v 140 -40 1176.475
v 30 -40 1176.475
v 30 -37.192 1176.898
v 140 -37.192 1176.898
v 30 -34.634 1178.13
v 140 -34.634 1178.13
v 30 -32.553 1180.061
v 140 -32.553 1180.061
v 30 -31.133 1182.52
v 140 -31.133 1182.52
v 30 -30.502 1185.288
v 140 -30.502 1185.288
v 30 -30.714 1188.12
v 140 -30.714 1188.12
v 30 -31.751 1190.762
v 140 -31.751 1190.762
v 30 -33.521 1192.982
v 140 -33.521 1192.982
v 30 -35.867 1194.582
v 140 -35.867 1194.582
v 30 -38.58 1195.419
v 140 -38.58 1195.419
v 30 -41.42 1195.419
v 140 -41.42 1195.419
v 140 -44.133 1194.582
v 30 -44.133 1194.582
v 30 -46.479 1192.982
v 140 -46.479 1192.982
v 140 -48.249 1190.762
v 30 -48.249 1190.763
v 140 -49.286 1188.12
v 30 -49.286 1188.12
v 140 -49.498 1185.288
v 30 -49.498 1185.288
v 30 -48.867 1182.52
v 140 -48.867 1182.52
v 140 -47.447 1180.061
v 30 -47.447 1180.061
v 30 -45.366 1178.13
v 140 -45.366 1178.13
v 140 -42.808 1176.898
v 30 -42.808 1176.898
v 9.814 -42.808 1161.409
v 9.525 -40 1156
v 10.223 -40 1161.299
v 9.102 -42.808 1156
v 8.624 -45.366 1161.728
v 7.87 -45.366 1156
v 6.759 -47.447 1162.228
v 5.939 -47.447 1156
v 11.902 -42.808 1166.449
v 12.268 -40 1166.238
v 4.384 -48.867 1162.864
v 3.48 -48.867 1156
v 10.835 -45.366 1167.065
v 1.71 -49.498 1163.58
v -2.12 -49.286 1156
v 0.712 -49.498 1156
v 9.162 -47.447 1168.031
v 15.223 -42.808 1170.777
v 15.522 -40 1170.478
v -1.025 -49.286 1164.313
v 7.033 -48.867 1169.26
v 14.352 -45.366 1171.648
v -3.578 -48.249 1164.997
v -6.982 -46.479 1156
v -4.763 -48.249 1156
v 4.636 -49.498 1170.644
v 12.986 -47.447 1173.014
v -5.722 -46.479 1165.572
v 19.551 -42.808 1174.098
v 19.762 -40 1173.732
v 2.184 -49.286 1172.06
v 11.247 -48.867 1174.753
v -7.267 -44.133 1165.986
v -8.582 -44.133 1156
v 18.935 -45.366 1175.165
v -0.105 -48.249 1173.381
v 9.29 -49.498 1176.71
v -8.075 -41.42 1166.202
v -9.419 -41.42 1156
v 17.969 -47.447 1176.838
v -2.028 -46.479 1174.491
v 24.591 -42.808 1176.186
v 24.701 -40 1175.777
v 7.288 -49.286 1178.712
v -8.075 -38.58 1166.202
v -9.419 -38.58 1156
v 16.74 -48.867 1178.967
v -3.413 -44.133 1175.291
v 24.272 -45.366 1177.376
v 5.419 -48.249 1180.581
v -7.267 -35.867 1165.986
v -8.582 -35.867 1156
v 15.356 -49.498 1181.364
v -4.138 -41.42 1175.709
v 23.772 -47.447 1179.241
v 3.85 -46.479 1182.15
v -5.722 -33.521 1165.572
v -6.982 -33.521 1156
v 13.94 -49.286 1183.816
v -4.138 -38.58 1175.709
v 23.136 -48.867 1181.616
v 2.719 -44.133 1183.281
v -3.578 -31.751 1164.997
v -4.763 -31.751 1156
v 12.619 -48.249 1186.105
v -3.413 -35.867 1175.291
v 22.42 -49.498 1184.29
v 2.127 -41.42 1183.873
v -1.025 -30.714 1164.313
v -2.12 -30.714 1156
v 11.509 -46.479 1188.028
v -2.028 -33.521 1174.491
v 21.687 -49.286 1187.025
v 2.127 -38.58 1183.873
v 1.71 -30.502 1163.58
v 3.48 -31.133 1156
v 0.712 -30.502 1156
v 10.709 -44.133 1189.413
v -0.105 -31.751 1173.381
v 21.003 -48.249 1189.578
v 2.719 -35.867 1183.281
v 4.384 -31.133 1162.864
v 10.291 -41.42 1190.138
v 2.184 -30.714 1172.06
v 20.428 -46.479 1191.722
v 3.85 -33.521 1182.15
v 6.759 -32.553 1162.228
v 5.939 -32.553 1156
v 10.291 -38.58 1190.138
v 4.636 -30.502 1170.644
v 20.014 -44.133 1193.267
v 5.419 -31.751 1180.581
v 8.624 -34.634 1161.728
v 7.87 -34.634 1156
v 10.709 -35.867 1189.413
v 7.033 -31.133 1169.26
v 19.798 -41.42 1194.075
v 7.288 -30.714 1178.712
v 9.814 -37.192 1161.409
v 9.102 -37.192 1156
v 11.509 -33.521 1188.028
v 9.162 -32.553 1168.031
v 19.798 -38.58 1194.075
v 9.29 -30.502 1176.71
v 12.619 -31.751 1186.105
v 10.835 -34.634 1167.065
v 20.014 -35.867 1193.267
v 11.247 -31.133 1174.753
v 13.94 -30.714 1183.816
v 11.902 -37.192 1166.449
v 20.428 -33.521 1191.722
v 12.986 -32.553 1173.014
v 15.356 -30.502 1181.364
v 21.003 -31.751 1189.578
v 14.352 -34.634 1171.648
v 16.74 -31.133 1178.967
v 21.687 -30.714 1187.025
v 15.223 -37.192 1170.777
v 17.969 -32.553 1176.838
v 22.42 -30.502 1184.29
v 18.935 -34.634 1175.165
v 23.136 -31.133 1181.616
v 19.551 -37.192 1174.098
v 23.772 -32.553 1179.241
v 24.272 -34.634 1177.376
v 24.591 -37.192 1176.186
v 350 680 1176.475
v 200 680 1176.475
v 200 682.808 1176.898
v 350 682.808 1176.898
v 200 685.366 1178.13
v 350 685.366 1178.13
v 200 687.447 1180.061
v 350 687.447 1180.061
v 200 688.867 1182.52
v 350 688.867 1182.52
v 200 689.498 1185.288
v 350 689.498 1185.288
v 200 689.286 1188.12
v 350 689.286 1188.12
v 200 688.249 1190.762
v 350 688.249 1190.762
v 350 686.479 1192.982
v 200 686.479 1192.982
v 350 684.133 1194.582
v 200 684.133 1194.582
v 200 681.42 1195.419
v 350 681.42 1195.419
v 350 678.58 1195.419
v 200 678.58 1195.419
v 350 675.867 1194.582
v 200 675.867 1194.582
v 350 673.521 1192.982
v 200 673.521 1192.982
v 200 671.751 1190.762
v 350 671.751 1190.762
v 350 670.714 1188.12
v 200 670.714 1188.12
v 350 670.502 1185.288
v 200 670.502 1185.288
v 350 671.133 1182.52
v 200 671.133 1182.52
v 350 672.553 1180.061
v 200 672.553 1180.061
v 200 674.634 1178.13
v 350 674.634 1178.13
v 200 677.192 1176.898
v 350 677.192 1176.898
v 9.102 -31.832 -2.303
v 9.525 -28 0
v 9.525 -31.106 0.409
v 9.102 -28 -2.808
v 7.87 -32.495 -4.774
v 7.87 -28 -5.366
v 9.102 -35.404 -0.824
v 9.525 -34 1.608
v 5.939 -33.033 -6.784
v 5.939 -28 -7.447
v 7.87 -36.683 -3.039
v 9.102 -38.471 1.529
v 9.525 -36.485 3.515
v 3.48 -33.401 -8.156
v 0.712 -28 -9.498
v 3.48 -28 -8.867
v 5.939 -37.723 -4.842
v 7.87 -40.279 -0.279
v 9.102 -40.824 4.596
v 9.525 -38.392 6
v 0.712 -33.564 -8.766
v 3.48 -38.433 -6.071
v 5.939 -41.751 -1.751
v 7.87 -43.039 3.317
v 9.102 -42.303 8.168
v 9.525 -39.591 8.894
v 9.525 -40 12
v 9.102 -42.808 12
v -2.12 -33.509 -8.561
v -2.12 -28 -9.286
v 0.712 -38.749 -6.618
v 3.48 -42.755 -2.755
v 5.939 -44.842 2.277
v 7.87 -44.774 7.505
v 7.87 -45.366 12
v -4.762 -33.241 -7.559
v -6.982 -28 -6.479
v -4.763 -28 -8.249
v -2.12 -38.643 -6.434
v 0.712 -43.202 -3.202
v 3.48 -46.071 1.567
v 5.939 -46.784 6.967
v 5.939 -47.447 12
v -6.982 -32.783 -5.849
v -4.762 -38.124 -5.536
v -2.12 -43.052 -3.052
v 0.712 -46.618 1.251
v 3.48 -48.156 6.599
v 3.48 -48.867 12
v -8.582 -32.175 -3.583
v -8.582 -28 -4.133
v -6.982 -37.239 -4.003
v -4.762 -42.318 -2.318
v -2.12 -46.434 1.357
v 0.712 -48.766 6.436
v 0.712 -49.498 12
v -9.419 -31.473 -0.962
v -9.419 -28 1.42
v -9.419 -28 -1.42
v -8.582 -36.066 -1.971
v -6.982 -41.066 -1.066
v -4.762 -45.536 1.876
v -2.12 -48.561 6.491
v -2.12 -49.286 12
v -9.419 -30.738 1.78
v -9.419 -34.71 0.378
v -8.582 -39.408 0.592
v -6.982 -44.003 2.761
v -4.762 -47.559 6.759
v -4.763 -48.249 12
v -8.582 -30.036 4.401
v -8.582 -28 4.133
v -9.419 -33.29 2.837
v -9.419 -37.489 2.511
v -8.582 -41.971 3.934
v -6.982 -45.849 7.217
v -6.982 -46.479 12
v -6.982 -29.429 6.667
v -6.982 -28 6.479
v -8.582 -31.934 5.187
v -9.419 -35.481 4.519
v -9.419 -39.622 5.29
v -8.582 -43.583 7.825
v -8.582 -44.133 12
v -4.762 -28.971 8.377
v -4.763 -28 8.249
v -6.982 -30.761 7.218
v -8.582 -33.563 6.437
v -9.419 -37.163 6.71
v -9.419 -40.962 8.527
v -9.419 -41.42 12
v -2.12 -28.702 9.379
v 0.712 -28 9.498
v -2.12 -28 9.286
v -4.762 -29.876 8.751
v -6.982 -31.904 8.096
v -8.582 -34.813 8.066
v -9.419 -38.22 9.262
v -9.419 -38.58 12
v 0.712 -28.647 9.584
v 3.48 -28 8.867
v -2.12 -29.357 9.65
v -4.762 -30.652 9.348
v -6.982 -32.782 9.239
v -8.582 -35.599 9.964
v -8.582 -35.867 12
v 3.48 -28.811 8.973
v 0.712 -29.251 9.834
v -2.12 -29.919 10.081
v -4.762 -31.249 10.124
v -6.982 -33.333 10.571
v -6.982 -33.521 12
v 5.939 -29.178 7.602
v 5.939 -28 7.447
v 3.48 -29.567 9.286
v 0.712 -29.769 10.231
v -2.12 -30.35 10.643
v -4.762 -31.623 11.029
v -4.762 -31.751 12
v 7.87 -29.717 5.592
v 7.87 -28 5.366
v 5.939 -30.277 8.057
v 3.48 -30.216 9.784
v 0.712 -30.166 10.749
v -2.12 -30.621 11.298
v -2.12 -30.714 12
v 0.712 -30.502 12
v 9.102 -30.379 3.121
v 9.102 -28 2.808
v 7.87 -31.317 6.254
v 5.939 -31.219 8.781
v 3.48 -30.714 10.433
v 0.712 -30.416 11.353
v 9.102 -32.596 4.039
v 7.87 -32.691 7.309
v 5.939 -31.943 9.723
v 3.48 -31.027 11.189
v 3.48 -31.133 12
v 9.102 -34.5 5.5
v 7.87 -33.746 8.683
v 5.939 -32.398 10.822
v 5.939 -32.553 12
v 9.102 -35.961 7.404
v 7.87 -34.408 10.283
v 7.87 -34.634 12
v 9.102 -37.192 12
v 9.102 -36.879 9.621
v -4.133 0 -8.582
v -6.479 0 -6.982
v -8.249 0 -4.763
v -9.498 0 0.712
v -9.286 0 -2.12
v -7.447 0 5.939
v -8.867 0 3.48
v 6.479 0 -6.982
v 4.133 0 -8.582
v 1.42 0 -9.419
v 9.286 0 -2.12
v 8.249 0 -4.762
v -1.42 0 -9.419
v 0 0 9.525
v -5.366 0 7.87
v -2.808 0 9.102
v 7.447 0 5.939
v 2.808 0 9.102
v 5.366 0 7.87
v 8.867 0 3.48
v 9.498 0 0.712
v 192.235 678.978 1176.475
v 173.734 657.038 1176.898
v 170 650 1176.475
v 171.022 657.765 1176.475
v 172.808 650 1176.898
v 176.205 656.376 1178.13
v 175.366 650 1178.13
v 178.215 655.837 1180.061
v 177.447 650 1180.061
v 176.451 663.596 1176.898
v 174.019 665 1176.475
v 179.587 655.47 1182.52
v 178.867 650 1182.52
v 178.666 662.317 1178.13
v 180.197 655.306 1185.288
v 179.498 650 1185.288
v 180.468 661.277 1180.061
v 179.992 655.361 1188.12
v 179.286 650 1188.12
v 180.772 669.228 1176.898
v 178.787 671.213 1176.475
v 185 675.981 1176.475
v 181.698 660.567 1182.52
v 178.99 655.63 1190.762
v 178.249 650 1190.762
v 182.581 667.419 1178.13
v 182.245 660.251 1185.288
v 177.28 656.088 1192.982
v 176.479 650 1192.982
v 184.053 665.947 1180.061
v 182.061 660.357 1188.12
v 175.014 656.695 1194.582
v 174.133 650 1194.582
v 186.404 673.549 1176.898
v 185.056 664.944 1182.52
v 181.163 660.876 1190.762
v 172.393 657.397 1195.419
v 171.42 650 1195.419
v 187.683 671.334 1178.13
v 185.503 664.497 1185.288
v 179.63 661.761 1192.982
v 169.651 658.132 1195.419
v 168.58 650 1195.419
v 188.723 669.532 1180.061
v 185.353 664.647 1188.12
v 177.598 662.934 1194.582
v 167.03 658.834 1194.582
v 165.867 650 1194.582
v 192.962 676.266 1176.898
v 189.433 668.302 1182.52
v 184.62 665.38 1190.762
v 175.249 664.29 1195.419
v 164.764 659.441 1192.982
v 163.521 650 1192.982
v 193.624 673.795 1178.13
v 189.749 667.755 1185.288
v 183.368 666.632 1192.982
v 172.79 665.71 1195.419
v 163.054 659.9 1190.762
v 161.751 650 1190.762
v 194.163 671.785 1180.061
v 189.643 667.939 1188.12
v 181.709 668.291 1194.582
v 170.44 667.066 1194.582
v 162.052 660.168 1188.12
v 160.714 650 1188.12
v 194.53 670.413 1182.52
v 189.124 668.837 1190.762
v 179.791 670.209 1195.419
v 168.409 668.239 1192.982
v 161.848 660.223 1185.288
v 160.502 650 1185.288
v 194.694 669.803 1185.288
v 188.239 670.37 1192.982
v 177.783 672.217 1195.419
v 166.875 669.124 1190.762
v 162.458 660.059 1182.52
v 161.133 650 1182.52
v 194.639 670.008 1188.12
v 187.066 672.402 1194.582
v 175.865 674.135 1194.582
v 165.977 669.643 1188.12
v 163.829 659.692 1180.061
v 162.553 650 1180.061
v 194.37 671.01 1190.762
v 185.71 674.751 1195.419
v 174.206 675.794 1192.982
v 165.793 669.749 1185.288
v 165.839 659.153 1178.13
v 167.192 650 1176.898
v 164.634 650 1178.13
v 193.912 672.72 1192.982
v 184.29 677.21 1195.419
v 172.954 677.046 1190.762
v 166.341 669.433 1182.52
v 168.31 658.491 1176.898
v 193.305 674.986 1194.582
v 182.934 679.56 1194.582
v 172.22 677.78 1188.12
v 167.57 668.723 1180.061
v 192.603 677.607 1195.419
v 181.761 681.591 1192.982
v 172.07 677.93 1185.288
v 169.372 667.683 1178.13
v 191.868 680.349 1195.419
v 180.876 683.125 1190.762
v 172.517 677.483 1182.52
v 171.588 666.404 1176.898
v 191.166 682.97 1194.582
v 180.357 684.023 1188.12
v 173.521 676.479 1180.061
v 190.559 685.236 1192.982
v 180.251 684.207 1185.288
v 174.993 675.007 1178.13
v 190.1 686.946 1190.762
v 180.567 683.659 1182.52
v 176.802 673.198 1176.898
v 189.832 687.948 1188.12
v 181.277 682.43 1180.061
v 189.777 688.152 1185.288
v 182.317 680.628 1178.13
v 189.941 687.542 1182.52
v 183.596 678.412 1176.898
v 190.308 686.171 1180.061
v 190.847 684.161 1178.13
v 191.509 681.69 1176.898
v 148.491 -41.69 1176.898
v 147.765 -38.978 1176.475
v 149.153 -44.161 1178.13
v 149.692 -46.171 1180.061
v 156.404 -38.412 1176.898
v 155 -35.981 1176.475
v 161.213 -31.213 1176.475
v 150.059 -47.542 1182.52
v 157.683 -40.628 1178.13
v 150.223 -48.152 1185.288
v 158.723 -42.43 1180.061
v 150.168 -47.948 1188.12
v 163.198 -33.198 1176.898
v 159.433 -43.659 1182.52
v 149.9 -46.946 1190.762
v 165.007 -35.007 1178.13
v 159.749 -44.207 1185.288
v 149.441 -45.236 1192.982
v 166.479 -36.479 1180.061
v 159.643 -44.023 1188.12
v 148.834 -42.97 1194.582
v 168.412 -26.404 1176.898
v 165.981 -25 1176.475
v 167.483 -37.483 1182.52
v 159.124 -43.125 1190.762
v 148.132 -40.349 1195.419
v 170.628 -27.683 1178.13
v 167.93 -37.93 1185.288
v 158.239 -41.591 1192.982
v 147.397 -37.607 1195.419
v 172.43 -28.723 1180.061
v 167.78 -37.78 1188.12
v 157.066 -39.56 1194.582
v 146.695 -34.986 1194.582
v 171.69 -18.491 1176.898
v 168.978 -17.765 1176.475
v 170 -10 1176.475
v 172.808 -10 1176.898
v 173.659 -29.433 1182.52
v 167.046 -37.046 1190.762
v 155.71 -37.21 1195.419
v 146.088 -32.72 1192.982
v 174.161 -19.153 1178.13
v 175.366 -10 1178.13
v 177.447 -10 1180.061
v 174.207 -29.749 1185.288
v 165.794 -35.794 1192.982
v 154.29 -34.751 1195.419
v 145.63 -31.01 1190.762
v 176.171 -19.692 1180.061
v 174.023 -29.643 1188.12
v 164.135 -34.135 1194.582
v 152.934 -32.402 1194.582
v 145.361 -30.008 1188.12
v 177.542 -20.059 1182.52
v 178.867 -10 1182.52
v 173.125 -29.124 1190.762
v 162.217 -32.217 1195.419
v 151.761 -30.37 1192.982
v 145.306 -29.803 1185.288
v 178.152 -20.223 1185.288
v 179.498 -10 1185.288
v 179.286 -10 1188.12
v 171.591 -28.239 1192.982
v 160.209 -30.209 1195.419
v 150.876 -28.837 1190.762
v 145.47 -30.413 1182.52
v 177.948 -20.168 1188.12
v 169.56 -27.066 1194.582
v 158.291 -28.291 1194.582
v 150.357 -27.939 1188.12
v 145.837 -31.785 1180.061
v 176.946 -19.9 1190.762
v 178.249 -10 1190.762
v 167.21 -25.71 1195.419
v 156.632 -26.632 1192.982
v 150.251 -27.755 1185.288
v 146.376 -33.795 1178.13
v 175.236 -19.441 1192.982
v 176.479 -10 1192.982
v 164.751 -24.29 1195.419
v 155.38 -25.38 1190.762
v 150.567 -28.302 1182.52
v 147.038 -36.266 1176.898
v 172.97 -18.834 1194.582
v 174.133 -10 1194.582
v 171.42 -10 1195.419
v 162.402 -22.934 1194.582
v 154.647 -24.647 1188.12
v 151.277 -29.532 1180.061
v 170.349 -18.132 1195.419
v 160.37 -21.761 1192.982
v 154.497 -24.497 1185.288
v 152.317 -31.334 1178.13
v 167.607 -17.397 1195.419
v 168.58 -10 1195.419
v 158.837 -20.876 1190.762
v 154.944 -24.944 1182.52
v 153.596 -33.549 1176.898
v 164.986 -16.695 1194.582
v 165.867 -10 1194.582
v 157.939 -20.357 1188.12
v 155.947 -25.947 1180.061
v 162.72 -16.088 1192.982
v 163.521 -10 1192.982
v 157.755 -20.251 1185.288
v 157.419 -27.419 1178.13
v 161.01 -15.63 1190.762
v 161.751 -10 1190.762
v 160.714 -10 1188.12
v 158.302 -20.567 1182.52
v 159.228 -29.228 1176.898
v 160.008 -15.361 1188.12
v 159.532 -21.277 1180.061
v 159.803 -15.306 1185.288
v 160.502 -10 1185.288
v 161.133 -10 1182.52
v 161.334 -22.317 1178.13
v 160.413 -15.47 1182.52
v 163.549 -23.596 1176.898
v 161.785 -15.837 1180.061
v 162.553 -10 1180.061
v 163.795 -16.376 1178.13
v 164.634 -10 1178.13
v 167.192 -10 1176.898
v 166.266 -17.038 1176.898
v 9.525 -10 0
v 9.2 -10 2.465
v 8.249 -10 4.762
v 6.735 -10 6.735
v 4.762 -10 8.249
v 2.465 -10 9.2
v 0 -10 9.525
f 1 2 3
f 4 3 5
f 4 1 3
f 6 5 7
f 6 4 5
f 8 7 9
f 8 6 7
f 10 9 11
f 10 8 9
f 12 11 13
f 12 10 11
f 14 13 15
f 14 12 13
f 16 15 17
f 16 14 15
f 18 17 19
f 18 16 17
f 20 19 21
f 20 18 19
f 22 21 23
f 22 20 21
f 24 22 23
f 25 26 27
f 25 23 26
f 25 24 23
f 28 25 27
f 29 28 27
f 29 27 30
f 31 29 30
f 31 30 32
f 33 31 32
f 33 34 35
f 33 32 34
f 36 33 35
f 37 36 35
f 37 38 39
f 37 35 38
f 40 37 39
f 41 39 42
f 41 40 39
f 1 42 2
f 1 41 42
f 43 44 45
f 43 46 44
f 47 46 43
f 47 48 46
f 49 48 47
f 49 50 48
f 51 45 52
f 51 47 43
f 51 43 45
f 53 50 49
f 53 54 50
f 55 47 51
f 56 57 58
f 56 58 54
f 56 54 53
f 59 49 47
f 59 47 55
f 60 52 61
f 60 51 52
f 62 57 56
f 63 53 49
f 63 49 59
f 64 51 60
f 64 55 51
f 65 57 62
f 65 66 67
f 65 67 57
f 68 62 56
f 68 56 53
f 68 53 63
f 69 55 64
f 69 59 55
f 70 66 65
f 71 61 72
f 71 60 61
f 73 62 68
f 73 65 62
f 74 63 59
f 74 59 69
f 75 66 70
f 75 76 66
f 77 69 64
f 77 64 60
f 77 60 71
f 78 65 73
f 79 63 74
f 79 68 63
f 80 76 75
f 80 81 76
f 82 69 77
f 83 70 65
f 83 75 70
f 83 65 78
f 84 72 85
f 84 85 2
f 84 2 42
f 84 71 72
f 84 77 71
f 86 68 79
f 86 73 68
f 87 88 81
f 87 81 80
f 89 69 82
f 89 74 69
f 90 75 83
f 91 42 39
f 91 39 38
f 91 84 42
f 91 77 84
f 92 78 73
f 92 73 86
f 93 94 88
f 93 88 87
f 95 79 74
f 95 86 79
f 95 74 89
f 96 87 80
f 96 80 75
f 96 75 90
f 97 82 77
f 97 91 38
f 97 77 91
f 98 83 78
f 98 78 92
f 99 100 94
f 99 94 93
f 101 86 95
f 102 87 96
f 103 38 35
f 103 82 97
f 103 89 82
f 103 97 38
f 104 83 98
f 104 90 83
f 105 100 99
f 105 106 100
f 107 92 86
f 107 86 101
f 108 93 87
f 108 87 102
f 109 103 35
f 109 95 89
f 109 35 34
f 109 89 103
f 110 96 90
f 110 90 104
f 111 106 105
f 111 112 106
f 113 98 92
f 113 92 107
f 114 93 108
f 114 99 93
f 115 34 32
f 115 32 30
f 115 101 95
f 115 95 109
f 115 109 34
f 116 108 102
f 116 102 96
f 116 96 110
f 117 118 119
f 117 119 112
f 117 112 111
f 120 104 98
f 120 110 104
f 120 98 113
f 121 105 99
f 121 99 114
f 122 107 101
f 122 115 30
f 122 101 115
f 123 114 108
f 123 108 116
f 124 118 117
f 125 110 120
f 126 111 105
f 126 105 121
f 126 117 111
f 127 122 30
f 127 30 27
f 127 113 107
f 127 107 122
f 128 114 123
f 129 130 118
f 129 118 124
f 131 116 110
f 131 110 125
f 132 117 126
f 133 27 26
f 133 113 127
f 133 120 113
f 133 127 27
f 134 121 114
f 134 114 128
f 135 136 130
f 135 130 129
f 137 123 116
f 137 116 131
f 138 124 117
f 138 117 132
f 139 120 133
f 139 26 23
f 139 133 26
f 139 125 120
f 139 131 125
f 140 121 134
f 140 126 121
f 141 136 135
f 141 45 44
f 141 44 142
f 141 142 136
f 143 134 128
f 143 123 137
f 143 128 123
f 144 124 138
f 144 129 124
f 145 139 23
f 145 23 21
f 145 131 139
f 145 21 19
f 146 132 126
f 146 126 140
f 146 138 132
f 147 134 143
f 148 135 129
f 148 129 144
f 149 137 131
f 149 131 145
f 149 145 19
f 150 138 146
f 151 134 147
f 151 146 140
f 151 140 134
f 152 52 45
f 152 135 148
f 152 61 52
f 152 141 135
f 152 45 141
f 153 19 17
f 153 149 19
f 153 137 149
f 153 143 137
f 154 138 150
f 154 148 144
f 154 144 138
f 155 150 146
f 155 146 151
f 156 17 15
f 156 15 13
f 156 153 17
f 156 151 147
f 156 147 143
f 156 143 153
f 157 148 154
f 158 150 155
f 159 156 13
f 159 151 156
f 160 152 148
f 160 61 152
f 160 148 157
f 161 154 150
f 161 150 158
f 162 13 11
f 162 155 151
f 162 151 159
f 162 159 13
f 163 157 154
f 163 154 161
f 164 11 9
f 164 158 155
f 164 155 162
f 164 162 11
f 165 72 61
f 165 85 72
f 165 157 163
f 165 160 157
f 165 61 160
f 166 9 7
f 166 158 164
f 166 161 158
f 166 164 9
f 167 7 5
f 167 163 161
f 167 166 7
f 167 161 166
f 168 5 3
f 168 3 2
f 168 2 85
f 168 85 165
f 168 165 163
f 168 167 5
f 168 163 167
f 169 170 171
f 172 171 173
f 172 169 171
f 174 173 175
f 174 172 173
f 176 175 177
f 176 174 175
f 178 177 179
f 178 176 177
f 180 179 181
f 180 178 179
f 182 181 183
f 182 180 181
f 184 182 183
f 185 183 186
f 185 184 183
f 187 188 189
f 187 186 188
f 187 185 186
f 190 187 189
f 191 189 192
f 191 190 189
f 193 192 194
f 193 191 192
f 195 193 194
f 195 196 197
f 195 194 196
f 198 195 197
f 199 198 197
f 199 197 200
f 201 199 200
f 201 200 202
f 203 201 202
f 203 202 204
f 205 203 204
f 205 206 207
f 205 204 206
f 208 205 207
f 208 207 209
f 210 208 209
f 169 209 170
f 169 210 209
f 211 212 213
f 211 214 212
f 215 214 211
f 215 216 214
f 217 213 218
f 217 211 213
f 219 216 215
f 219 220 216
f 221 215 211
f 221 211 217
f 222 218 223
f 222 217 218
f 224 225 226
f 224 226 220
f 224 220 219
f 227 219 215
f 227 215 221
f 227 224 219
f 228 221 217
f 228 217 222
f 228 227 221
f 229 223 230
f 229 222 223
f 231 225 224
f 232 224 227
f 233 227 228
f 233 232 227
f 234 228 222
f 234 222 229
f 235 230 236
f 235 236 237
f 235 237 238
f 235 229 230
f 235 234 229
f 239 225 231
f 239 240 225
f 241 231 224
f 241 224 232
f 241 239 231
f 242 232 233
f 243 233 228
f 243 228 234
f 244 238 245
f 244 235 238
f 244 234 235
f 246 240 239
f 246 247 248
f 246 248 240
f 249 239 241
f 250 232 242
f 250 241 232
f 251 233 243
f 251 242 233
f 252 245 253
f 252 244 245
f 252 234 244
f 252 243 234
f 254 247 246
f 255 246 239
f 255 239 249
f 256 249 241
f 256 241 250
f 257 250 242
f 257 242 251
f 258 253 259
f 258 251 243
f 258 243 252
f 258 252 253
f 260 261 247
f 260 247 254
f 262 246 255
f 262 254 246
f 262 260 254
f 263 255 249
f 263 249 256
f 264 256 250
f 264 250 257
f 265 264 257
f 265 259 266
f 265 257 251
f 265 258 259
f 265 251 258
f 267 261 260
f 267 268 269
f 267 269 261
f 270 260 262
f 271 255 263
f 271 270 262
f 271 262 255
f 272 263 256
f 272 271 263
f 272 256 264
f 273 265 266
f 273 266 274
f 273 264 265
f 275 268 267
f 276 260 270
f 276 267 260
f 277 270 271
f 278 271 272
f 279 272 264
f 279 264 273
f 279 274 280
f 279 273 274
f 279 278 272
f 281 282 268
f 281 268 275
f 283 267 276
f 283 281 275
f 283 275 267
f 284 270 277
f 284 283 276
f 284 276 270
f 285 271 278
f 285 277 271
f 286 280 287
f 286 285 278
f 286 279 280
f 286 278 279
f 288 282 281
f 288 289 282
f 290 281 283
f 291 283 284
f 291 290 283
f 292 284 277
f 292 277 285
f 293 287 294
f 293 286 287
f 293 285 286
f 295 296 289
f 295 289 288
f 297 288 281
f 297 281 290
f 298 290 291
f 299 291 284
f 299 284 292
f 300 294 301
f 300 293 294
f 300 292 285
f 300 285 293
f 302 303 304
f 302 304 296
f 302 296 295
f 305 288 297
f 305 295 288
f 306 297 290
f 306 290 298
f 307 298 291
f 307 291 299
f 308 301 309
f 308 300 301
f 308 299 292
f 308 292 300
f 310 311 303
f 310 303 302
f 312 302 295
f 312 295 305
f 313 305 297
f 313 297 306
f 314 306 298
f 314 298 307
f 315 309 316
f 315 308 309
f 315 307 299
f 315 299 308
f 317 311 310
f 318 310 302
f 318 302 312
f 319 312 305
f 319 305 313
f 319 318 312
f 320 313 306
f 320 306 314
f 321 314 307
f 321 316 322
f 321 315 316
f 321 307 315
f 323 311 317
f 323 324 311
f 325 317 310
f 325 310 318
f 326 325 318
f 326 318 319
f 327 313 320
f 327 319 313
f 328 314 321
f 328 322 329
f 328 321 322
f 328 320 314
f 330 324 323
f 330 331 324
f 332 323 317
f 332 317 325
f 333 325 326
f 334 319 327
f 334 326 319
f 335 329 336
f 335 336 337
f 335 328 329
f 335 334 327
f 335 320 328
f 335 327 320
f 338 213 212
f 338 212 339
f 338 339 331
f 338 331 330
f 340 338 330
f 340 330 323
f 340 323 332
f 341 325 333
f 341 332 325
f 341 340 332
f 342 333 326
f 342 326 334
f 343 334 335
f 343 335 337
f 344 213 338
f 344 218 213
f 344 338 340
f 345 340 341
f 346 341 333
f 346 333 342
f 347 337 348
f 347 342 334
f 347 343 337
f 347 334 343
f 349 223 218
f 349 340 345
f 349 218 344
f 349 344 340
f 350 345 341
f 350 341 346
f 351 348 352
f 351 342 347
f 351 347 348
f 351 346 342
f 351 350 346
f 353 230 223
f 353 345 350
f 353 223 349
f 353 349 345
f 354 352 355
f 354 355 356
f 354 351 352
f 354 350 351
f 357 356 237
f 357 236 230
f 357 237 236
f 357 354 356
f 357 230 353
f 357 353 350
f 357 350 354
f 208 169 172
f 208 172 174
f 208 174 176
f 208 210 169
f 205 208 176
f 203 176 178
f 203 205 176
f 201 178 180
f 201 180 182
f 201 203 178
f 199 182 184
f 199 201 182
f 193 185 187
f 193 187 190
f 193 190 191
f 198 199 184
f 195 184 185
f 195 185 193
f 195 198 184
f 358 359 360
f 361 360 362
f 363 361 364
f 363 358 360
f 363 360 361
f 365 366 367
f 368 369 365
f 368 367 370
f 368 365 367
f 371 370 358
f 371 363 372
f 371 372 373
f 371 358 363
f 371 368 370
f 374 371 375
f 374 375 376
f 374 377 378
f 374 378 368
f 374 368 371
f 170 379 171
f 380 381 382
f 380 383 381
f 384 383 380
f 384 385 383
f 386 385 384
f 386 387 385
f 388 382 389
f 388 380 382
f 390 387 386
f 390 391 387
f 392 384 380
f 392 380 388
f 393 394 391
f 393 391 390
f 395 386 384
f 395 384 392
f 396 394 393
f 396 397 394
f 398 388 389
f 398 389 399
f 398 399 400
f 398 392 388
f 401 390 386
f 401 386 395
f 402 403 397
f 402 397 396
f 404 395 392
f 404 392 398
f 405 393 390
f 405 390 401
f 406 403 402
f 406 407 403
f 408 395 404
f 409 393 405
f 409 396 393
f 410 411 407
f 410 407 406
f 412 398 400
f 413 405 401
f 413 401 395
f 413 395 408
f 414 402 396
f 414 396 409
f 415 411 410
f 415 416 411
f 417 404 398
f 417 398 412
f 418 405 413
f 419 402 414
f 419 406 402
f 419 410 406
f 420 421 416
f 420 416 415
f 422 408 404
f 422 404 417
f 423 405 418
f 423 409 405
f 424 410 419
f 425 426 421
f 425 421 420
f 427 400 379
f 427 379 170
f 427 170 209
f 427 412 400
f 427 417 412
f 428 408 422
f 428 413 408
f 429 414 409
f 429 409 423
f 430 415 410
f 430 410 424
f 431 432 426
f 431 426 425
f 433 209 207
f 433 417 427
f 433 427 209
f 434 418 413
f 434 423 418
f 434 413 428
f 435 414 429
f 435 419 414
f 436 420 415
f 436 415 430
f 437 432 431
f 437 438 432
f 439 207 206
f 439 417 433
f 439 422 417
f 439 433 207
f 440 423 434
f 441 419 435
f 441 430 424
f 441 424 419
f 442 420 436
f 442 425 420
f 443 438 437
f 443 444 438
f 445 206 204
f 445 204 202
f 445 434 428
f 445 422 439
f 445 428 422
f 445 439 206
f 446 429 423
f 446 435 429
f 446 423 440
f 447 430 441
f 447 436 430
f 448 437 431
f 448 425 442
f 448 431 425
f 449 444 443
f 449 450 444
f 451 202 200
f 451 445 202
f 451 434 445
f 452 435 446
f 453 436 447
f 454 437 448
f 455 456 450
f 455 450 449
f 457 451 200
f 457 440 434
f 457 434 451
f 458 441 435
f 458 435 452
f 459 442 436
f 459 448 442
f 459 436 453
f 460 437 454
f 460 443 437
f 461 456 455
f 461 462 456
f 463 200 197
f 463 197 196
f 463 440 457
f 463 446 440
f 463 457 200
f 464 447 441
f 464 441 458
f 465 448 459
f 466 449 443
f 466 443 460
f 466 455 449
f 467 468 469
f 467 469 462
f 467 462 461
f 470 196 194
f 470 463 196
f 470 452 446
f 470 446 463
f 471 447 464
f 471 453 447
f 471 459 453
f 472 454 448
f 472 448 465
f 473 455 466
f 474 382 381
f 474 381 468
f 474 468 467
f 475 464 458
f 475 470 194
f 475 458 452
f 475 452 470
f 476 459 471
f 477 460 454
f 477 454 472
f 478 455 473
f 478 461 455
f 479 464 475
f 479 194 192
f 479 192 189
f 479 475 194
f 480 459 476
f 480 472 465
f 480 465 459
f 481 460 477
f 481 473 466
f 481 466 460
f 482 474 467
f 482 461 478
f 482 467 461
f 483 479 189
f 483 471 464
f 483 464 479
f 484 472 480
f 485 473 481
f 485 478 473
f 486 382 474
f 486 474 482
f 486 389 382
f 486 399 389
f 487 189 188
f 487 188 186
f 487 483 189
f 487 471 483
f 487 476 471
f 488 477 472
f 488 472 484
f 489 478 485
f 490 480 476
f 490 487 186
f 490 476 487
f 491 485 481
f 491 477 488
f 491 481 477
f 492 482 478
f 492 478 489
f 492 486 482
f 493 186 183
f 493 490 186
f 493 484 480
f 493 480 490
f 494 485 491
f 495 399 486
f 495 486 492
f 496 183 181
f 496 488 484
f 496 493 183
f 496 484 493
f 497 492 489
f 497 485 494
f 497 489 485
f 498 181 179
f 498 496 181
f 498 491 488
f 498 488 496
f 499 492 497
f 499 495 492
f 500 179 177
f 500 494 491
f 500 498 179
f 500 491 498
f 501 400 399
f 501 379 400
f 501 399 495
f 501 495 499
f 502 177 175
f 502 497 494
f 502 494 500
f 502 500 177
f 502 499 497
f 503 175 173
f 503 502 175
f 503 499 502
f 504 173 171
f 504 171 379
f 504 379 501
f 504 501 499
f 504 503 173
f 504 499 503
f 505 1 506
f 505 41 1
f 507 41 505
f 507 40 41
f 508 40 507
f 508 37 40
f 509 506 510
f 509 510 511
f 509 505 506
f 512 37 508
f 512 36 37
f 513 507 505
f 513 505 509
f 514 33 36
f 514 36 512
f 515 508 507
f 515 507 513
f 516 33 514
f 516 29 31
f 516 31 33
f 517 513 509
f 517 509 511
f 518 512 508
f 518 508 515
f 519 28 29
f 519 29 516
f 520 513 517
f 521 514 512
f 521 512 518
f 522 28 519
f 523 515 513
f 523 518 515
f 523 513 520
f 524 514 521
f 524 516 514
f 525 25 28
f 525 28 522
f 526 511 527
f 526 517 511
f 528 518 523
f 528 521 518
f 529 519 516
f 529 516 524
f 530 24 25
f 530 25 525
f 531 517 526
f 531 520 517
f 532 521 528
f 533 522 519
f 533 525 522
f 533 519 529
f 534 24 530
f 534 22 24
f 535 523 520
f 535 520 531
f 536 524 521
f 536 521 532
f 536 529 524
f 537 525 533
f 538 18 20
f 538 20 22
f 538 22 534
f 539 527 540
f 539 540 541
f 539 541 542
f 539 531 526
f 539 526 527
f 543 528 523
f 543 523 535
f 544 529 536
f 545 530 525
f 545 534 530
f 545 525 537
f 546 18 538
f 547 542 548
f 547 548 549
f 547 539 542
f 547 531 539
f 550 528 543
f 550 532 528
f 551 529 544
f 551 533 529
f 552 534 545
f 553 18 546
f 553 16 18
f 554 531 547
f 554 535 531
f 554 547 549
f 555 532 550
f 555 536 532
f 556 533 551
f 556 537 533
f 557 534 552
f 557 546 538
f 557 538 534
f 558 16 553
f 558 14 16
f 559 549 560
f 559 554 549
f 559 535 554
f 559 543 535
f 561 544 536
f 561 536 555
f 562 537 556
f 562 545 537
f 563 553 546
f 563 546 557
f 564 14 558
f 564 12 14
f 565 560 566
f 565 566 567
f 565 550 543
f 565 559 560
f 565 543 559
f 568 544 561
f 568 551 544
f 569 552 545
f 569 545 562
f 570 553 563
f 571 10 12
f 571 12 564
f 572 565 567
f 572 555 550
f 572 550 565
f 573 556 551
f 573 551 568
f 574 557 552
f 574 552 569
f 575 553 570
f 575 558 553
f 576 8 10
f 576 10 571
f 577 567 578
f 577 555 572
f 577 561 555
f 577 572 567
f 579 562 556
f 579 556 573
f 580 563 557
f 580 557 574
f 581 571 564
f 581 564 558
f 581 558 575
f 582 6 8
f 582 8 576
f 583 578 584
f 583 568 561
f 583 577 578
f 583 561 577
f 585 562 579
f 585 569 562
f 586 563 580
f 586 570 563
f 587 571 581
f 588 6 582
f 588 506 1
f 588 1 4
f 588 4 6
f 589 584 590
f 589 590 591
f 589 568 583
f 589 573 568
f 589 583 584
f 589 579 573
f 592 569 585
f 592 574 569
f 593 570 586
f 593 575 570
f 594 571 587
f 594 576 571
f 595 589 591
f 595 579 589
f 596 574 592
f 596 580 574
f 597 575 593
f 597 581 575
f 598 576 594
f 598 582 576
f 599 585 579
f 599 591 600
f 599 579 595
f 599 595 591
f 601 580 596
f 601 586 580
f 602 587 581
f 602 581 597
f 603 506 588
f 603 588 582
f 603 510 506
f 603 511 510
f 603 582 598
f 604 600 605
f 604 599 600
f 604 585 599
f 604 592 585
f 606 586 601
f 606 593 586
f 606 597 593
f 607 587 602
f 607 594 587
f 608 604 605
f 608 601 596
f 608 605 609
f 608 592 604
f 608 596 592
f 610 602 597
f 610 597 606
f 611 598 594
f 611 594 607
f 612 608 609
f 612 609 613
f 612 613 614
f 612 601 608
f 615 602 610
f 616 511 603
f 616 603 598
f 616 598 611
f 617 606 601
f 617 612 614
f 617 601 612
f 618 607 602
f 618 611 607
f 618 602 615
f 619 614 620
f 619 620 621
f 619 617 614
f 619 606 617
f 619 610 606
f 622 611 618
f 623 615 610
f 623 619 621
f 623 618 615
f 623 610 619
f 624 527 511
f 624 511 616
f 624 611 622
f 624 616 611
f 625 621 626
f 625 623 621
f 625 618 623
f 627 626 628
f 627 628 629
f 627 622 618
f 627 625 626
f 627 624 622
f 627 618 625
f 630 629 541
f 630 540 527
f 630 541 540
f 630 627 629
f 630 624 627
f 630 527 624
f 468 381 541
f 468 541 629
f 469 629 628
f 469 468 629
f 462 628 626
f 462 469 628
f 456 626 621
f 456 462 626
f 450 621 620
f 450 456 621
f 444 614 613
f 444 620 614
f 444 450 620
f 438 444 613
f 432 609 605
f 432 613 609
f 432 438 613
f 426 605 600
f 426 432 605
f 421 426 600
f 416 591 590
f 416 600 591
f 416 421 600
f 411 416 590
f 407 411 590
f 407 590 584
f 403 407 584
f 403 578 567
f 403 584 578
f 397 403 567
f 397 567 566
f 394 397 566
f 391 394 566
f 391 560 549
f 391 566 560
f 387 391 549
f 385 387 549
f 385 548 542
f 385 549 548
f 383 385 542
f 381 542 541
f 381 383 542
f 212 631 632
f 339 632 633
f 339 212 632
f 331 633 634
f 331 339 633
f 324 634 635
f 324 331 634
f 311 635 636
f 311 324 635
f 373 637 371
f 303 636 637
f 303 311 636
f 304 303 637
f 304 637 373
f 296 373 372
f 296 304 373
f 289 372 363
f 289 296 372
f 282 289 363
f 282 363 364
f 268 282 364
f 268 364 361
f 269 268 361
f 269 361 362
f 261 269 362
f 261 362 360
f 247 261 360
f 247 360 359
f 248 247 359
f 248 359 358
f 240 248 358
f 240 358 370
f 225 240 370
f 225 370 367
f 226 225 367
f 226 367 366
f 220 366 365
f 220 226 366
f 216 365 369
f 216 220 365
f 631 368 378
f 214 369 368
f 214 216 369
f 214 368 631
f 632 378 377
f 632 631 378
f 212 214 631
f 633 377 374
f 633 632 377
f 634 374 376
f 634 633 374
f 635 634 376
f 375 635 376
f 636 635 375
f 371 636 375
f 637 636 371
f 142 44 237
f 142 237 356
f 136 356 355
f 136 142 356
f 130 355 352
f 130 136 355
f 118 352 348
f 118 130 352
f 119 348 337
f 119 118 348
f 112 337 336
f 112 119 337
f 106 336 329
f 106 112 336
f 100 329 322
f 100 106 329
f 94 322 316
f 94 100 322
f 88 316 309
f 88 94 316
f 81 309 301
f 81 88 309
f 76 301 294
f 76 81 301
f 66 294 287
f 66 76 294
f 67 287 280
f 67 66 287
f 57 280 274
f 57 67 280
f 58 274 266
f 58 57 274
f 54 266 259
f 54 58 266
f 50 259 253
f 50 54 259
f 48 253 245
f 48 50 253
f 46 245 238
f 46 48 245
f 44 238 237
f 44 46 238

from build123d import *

# Parameters (mm, degrees)
CROQUIS1_R              = 9.525
SALIENTE_EXTRUIR1_DEPTH = 10
CROQUIS2_R              = 9.525


with BuildPart() as part:
    # Croquis1 → Saliente-Extruir1 (new body)
    with BuildSketch(Plane(origin=(0, 0, 0), x_dir=(1, 0, 0), z_dir=(0, 1, 0))):
        with Locations(Location((0, 0, 0), (0, 0, 270))):
            Circle(CROQUIS1_R)
    extrude(amount=-SALIENTE_EXTRUIR1_DEPTH)

    # Barrer1: sweep along a curve in space
    with BuildLine() as barrer1_path:
        Line((0, -10, 0), (0, -28, 0))
        ThreePointArc((0, -28, 0), (0, -36.485281374, 3.514718626), (0, -40, 12))
        Line((0, -40, 12), (0, -40, 1156))
        ThreePointArc((0, -40, 1156), (8.786796564, -40, 1177.213203436), (30, -40, 1186))
        Line((30, -40, 1186), (140, -40, 1186))
        ThreePointArc((140, -40, 1186), (161.213203436, -31.213203436, 1186), (170, -10, 1186))
        Line((170, -10, 1186), (170, 650, 1186))
        ThreePointArc((170, 650, 1186), (178.786796564, 671.213203436, 1186), (200, 680, 1186))
        Line((200, 680, 1186), (350, 680, 1186))
    # Croquis2 → Barrer1 (sweep)
    with BuildSketch(Plane.XZ.offset(10)):
        Circle(CROQUIS2_R)
    sweep(path=barrer1_path.line)


solid = part.part
